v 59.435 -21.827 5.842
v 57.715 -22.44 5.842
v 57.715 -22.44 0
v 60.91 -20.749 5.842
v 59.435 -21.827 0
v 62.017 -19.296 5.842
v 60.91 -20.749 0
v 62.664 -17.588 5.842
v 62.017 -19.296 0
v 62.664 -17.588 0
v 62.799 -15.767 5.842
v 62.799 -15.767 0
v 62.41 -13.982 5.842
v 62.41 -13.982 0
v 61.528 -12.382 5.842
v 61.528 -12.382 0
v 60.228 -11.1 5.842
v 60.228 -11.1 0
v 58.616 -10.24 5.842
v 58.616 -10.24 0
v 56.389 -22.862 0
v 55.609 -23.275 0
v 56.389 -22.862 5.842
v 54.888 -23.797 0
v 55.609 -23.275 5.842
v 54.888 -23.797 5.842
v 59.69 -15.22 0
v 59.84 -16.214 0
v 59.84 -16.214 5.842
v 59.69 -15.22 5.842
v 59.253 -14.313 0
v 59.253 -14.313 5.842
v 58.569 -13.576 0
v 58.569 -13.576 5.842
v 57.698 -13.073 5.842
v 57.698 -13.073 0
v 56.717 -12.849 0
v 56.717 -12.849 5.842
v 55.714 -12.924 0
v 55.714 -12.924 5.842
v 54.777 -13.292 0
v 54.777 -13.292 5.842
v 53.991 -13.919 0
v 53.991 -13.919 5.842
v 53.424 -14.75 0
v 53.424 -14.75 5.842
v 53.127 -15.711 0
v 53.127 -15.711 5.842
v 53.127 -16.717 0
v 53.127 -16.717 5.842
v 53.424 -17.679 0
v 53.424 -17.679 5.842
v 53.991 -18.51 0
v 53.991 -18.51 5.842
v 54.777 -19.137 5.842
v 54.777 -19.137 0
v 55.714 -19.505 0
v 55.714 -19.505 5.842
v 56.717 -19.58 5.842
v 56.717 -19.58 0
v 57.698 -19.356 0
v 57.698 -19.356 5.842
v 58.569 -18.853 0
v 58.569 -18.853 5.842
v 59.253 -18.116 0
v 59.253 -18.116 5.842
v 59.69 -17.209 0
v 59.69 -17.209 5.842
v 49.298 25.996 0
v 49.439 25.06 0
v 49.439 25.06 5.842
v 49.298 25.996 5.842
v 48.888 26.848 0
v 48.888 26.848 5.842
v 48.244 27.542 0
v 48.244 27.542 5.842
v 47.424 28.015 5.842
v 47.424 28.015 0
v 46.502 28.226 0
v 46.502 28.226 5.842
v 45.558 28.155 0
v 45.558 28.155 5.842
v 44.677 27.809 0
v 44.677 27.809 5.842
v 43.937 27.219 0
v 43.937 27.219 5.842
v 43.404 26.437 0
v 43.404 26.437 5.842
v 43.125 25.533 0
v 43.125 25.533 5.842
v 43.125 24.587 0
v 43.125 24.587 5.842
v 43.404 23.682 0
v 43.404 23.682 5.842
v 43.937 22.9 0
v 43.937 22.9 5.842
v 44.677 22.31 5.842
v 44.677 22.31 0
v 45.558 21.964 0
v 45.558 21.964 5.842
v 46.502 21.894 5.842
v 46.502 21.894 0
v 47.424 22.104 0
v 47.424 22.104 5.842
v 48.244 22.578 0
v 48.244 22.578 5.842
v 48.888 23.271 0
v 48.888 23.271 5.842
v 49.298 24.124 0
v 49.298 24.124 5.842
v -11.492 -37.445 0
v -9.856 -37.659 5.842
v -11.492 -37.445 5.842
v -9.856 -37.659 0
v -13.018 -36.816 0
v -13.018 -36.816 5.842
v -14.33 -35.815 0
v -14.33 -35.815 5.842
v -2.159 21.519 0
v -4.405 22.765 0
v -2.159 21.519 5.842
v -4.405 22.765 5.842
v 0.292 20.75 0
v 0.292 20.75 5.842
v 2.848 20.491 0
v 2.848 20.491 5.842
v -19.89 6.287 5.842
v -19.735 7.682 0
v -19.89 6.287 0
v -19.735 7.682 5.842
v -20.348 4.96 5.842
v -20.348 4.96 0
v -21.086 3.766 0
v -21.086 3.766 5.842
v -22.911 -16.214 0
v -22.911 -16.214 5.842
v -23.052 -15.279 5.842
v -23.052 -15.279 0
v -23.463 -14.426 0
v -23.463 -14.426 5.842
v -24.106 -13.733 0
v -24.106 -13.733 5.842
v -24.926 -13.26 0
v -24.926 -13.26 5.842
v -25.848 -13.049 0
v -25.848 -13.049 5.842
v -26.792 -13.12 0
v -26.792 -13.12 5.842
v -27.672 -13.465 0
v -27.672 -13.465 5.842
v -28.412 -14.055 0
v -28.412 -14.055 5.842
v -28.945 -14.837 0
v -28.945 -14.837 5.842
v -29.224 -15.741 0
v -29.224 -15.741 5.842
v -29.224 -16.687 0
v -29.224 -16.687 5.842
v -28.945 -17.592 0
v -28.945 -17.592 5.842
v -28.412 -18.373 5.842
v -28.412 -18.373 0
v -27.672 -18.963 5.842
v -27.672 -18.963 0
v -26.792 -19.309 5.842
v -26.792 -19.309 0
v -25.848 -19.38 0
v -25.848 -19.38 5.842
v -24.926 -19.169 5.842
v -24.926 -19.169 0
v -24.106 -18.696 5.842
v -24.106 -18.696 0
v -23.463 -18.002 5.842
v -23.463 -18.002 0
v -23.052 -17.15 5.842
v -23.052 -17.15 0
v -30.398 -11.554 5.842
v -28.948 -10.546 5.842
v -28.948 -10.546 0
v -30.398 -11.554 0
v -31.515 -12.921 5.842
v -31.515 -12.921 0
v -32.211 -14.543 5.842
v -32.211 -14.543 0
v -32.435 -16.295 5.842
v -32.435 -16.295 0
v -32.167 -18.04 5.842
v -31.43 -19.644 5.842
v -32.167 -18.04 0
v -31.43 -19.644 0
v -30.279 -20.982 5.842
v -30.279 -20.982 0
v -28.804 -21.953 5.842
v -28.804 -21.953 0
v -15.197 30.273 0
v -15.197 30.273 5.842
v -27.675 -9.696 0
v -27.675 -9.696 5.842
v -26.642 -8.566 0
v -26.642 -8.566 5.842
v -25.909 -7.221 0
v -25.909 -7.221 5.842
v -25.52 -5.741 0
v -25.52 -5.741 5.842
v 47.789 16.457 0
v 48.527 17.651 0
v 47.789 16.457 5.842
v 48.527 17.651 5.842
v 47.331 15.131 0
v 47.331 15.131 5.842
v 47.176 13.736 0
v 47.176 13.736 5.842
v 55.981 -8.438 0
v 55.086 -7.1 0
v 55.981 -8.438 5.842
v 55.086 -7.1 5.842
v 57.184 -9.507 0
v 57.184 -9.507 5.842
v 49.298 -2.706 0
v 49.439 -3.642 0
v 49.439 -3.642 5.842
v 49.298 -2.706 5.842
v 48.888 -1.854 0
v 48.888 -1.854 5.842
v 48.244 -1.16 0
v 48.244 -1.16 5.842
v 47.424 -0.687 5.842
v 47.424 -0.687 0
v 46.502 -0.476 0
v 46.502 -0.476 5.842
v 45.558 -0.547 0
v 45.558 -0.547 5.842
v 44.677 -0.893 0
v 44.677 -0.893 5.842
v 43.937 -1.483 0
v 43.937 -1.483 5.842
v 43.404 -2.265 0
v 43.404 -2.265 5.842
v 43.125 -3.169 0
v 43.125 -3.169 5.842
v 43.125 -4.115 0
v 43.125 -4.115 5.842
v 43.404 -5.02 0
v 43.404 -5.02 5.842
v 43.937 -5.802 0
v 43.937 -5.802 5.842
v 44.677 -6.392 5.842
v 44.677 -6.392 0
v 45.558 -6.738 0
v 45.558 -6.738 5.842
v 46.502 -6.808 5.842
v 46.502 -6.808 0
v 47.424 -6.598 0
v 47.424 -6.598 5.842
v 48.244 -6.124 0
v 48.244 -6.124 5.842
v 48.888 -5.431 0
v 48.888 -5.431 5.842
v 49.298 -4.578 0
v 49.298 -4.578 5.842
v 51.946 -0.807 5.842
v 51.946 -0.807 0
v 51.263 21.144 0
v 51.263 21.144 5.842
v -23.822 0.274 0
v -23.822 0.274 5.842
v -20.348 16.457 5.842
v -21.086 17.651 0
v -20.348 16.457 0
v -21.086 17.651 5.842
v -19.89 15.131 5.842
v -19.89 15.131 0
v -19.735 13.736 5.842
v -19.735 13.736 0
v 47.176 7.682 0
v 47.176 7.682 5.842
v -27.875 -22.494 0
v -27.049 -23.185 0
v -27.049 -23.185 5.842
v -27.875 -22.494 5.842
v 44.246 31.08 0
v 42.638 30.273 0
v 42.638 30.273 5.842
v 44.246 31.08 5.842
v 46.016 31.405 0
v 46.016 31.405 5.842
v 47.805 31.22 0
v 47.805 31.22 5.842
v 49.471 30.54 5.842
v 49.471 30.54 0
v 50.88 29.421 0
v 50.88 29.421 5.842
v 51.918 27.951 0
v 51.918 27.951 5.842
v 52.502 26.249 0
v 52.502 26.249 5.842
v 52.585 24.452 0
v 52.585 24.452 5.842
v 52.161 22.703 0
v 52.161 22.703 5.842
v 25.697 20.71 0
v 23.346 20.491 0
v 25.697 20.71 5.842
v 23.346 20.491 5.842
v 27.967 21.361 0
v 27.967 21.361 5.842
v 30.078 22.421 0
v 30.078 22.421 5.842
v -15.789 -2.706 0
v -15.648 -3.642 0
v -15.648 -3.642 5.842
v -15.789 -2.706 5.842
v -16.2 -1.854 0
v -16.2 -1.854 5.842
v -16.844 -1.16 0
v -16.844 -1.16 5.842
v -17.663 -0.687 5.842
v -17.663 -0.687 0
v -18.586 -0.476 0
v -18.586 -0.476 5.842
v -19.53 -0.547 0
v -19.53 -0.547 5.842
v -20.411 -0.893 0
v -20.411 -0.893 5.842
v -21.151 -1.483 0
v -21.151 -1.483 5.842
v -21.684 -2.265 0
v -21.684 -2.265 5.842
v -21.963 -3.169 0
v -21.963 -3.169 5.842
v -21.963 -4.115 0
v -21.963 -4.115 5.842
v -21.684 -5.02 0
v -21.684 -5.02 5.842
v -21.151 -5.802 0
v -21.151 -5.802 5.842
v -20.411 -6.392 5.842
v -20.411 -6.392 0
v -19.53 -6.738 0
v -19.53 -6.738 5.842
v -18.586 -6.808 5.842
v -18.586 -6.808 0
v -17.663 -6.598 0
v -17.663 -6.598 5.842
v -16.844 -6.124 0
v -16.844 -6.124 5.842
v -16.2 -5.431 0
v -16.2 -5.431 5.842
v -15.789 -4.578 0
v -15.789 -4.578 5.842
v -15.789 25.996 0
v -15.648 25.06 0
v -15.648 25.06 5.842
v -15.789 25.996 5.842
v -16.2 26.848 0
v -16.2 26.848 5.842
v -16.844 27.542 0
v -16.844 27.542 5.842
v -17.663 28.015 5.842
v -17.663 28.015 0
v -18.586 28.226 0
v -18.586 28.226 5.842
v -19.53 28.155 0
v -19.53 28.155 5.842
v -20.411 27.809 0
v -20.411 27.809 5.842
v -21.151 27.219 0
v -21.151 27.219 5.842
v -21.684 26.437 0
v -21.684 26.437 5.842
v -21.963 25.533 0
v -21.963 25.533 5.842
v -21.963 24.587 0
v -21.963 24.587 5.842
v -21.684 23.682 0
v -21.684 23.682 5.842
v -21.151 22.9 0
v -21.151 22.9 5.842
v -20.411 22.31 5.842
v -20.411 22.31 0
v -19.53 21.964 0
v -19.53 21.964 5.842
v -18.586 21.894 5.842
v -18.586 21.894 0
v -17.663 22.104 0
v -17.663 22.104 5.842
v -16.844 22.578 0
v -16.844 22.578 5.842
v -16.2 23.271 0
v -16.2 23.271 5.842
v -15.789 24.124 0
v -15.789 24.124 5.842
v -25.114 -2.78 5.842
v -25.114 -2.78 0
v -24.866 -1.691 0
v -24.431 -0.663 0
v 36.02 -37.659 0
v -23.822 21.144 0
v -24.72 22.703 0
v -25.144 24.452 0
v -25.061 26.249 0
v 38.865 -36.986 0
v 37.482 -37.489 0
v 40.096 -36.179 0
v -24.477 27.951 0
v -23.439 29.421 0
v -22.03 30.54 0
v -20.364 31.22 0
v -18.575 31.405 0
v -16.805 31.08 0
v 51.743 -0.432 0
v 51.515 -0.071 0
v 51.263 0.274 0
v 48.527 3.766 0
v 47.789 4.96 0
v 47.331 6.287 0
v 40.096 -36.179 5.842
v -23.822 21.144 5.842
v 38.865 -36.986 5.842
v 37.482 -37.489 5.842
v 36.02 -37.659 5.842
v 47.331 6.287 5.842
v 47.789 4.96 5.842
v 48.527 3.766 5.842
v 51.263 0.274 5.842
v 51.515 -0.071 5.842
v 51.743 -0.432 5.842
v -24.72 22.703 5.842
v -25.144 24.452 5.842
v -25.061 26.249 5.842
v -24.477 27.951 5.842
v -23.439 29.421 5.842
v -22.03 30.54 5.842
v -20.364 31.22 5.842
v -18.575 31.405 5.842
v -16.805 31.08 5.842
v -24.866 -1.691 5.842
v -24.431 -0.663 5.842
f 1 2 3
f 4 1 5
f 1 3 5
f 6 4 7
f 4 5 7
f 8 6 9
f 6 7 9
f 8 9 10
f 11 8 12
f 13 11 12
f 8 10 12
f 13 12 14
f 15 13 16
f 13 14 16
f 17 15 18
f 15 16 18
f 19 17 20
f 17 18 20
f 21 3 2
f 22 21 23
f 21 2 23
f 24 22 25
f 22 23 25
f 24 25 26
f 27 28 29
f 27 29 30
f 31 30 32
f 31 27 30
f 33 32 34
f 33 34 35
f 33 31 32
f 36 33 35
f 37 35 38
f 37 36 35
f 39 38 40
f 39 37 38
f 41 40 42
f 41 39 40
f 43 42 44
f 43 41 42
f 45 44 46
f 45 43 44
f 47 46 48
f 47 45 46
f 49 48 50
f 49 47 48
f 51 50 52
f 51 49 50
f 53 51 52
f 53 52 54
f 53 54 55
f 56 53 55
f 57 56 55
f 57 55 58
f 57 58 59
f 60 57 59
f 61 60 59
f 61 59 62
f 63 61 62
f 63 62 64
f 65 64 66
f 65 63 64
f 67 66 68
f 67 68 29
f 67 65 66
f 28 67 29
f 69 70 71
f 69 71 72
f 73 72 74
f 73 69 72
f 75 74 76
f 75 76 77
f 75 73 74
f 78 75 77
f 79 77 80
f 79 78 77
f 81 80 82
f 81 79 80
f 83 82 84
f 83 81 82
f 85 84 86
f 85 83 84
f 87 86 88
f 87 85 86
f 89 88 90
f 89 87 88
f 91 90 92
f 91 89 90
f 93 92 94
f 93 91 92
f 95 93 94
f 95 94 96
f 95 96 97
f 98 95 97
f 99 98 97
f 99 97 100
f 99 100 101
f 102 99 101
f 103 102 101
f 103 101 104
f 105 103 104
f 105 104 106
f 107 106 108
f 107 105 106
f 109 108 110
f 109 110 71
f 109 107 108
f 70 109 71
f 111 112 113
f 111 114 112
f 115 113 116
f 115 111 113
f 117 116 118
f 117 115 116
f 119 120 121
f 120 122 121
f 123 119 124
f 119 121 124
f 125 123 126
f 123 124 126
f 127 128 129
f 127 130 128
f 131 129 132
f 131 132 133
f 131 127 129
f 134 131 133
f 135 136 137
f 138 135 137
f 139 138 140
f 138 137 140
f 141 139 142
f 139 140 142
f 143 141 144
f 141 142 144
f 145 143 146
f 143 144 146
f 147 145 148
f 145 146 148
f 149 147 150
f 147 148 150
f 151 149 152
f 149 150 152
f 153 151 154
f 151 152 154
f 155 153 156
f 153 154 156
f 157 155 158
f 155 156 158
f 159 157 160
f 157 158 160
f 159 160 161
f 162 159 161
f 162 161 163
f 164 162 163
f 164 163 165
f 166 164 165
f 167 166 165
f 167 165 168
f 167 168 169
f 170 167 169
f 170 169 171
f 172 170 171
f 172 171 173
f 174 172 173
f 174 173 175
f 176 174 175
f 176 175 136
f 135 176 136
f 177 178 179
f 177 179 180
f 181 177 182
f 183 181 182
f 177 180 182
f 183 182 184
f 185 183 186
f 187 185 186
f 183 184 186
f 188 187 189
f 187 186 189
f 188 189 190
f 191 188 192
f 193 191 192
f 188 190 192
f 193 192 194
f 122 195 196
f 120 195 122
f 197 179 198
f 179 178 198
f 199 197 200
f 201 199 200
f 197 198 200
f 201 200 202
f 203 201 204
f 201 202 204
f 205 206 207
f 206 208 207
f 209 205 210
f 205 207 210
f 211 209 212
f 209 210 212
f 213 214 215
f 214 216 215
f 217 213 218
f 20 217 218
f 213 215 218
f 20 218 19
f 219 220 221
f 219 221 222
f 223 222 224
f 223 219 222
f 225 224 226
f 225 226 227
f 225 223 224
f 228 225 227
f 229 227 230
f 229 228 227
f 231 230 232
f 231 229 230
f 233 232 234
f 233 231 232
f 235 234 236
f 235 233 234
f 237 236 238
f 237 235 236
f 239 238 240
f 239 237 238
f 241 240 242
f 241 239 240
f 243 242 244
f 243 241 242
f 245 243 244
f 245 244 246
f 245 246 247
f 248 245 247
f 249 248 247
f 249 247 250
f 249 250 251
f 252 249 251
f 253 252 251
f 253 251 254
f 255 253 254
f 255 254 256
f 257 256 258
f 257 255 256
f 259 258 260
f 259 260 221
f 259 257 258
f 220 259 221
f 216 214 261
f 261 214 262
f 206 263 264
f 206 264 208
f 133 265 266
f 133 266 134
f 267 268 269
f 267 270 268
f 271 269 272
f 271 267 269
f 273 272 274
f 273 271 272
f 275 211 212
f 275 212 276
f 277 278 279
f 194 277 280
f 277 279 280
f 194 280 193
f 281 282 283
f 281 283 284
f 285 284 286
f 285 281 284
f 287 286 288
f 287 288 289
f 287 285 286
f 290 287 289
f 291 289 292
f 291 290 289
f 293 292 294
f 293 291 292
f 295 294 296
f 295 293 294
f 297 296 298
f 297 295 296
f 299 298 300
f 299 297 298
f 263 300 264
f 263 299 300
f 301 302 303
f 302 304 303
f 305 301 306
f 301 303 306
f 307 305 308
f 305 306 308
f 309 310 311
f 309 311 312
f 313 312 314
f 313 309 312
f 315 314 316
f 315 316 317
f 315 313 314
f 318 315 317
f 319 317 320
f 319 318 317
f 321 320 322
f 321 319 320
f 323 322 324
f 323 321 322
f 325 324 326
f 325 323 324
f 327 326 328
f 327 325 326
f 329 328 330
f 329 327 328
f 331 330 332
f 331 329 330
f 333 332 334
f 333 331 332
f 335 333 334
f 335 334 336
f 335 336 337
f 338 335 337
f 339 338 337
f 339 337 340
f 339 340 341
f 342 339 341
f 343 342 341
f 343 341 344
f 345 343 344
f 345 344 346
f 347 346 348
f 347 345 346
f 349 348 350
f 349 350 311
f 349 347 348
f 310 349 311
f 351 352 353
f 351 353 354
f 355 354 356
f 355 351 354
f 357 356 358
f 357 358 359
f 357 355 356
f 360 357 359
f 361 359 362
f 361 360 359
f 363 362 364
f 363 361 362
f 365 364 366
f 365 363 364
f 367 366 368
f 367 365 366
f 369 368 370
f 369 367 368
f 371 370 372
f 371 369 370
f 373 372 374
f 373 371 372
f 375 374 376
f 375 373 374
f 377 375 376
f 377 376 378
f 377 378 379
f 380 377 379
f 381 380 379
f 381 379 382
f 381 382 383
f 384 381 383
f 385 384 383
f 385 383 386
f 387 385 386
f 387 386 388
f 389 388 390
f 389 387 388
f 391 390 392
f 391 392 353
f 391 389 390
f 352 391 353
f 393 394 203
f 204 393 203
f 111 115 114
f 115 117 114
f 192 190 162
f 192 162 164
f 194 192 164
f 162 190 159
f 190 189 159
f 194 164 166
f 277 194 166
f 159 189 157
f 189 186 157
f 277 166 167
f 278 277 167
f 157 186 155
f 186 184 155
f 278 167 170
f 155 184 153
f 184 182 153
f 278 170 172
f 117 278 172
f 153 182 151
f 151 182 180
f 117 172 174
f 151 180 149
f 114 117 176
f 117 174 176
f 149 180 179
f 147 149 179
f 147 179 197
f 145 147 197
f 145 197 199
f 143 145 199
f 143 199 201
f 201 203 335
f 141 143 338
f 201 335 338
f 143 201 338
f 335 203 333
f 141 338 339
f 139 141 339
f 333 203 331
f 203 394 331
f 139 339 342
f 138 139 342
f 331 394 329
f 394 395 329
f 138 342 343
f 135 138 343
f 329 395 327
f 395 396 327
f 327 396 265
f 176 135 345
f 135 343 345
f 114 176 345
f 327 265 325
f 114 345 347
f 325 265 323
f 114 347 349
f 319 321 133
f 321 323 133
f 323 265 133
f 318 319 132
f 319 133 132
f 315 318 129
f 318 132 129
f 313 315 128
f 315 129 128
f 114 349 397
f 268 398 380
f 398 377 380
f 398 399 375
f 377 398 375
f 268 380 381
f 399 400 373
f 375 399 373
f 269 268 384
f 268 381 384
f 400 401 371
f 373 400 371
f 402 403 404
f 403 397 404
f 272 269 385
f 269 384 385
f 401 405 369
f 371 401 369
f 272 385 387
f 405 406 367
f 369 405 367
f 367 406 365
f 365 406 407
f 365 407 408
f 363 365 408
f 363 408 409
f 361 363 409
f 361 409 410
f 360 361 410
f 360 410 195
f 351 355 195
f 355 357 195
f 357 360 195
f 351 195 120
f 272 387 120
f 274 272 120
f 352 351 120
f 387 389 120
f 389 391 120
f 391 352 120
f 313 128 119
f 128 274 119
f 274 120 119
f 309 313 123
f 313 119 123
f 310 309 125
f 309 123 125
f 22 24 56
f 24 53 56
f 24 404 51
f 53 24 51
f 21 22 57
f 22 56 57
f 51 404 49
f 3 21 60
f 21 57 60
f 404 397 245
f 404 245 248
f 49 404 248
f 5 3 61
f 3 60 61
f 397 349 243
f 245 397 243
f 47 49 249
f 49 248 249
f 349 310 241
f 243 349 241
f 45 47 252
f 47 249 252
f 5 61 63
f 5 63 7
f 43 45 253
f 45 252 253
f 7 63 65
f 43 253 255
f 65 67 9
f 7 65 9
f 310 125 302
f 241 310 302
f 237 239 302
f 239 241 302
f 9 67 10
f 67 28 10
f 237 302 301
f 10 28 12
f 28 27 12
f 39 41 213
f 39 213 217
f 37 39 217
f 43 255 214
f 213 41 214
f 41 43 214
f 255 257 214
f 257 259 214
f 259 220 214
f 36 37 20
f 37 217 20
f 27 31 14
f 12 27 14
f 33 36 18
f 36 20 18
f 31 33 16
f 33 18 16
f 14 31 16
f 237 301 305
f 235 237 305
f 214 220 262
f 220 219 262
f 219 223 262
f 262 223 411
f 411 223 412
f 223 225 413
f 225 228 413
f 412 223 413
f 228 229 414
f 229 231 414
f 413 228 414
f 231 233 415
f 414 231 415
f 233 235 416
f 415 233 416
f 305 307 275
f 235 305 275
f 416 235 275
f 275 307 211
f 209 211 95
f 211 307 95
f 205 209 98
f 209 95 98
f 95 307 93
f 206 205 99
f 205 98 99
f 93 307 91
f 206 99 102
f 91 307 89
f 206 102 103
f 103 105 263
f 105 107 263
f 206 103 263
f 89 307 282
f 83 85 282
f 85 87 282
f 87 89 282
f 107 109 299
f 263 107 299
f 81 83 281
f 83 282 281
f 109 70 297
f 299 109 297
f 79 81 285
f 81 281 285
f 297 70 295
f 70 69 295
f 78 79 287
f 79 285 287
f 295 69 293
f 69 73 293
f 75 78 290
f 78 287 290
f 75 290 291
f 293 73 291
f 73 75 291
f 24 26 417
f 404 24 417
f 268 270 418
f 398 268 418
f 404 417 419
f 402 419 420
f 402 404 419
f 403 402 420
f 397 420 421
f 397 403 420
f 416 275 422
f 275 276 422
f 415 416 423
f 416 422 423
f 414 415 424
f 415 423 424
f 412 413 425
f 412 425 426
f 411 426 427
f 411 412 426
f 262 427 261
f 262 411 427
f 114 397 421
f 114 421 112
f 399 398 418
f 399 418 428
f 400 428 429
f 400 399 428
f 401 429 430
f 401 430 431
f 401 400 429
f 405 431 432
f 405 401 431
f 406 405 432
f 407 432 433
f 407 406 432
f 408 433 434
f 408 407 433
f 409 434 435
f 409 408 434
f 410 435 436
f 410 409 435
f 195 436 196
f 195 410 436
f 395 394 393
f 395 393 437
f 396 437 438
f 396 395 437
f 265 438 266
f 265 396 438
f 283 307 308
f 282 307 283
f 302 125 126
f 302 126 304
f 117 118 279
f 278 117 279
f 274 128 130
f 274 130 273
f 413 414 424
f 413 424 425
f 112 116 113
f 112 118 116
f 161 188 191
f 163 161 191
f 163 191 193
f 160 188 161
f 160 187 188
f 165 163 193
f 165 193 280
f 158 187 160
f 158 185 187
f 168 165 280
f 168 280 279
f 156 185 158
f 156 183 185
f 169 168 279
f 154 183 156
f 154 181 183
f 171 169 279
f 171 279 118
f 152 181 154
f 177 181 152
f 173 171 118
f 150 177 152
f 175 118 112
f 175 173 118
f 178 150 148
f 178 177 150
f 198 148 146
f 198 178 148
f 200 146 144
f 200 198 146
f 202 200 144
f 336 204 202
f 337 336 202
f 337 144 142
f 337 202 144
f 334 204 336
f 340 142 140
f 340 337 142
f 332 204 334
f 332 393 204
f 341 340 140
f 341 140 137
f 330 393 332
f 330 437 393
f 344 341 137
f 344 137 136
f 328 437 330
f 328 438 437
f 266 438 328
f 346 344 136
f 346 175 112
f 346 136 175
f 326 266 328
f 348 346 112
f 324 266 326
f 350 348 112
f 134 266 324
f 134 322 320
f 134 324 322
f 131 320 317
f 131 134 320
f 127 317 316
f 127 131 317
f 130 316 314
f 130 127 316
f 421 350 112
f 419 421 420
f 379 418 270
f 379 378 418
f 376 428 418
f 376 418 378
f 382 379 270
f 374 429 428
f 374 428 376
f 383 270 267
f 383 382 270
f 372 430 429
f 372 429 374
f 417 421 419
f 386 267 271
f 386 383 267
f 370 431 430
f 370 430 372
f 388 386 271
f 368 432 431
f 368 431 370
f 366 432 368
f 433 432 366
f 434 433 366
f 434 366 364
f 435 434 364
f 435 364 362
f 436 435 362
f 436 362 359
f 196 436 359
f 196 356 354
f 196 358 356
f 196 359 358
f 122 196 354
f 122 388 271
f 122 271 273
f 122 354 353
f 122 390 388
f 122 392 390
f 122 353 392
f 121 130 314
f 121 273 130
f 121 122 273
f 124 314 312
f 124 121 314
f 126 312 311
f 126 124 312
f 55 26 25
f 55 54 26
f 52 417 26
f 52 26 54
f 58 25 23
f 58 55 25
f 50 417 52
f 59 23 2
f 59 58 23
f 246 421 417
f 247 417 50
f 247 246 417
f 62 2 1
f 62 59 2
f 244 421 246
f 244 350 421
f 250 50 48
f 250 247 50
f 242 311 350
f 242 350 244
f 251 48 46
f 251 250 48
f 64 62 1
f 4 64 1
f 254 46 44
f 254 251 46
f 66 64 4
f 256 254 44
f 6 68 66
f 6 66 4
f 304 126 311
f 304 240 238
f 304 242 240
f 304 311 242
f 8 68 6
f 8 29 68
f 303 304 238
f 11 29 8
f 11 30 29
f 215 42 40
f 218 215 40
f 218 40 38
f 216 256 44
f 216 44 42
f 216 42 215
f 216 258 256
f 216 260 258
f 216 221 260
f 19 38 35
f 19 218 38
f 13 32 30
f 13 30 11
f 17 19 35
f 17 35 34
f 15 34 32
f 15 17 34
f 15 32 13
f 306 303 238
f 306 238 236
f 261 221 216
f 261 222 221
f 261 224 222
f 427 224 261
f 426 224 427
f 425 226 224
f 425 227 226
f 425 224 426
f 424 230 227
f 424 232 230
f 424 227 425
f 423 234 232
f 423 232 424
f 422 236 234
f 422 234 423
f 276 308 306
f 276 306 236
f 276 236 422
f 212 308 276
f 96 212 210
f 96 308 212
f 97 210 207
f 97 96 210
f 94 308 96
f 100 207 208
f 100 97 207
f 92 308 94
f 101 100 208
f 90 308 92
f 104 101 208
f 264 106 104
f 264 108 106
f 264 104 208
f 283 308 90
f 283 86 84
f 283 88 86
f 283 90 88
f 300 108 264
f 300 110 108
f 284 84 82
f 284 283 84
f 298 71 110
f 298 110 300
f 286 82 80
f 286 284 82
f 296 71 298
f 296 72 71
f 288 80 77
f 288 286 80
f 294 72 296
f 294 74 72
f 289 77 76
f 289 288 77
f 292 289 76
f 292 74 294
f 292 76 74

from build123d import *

# Parameters (mm, degrees)
SKETCH1_R           = 3.1750000000000016
SKETCH1_R_2         = 3.174999999999998
SKETCH1_R_3         = 3.1749999999999976
BOSS_EXTRUDE1_DEPTH = 5.842
FILLET1_R           = 6.35
FILLET2_R           = 12.7
BOSS_EXTRUDE2_START = -5.842
SKETCH2_R           = 3.3749999999999933
BOSS_EXTRUDE2_DEPTH = 5.842
SKETCH3_R           = 3.174229815615873
CUT_EXTRUDE1_DEPTH  = 74.47150684282778
FILLET3_R           = 6.35
CUT_EXTRUDE2_DEPTH  = 74.47150698753184
FILLET4_R           = 6.35


with BuildPart() as part:
    # Sketch1 → Boss-Extrude1 (new body)
    with BuildSketch(Plane.XY):
        with BuildLine():
            Line((-19.735202783136515, 15.926469991088537), (-23.82219128055887, 21.14411855360569))
            ThreePointArc((-23.82219128055887, 21.14411855360569), (-23.43878883536159, 29.420896018239304), (-15.19702887852625, 30.27262100199607))
            Line((-15.19702887852625, 30.27262100199607), (-1.1351215821202347, 20.490721215283713))
            Line((-1.1351215821202347, 20.490721215283713), (26.98869301069201, 20.49072121528371))
            Line((26.98869301069201, 20.49072121528371), (42.6381003070978, 30.272621001996075))
            ThreePointArc((42.6381003070978, 30.272621001996075), (50.87986026393313, 29.42089601823929), (51.26326270913039, 21.14411855360571))
            Line((51.26326270913039, 21.14411855360571), (47.176274211707955, 15.926469991088574))
            Line((47.176274211707955, 15.926469991088574), (47.176274211707955, 5.491172866054349))
            Line((47.176274211707955, 5.491172866054349), (51.26326270913039, 0.27352430353700524))
            ThreePointArc((51.26326270913039, 0.27352430353700524), (52.26703524751068, -1.5710682312081294), (52.614285714285785, -3.6421785714286505))
            Line((52.614285714285785, -3.6421785714286505), (52.614285714285785, -37.659455709821316))
            Line((52.614285714285785, -37.659455709821316), (-25.173214285713918, -37.659455709821316))
            Line((-25.173214285713918, -37.659455709821316), (-25.173214285713925, -3.6421785714286505))
            ThreePointArc((-25.173214285713925, -3.6421785714286505), (-24.825963818939076, -1.5710682312081503), (-23.822191280558854, 0.27352430353699286))
            Line((-23.822191280558854, 0.27352430353699286), (-19.735202783136522, 5.491172866054132))
            Line((-19.735202783136522, 5.491172866054132), (-19.735202783136515, 15.926469991088537))
        make_face()
        with Locations((-18.823214285714226, 25.059821428571347)):
            Circle(SKETCH1_R, mode=Mode.SUBTRACT)
        with Locations((46.26428571428577, 25.059821428571347)):
            Circle(SKETCH1_R_2, mode=Mode.SUBTRACT)
        with Locations((46.26428571428577, -3.6421785714286505)):
            Circle(SKETCH1_R_3, mode=Mode.SUBTRACT)
        with Locations((-18.823214285713924, -3.6421785714286505)):
            Circle(SKETCH1_R, mode=Mode.SUBTRACT)
    extrude(amount=BOSS_EXTRUDE1_DEPTH)

    # Fillet1
    fillet1_edges = [part.edges().sort_by_distance(p)[0] for p in [
        (47.176274211707955, 15.926469991088574, 2.921),
        (47.176274211707955, 5.491172866054349, 2.921),
        (-19.735202783136522, 5.491172866054132, 2.921),
        (-19.735202783136515, 15.926469991088537, 2.921),
    ]]
    fillet(fillet1_edges, radius=FILLET1_R)

    # Fillet2
    fillet2_edges = [part.edges().sort_by_distance(p)[0] for p in [
        (-1.1351215821202347, 20.490721215283713, 2.921),
        (26.98869301069201, 20.49072121528371, 2.921),
    ]]
    fillet(fillet2_edges, radius=FILLET2_R)

    # Sketch2 → Boss-Extrude2 (add)
    # profile 1 of 2: a face of its own
    with BuildSketch(Plane.XY.offset(5.842).offset(BOSS_EXTRUDE2_START)):
        with BuildLine():
            Line((52.614285714285785, -22.564372384825948), (56.4647972168636, -22.564372384825948))
            ThreePointArc((56.4647972168636, -22.564372384825948), (62.8147972168636, -16.214372384825946), (56.4647972168636, -9.864372384825945))
            Line((56.4647972168636, -9.864372384825945), (51.94643033410118, -0.8074418077232544))
            ThreePointArc((51.94643033410118, -0.8074418077232544), (52.44506715095817, -2.186005219081439), (52.614285714285785, -3.6421785714286505))
            Line((52.614285714285785, -3.6421785714286505), (52.614285714285785, -11.165009933138013))
            Line((52.614285714285785, -11.165009933138013), (52.614285714285785, -21.26373483651388))
            Line((52.614285714285785, -21.26373483651388), (52.614285714285785, -22.564372384825948))
        make_face()
        with Locations((56.4647972168636, -16.214372384825946)):
            Circle(SKETCH2_R, mode=Mode.SUBTRACT)
    # profile 2 of 2: a face of its own
    with BuildSketch(Plane.XY.offset(5.842).offset(BOSS_EXTRUDE2_START)):
        with BuildLine():
            Line((-25.11442078188718, -2.7800760122689354), (-26.085202783136417, -9.864372384825948))
            ThreePointArc((-26.085202783136417, -9.864372384825948), (-32.43520278313642, -16.21437238482595), (-26.085202783136413, -22.56437238482595))
            Line((-26.085202783136417, -22.56437238482595), (-25.17321428571397, -22.56437238482595))
            Line((-25.17321428571397, -22.56437238482595), (-25.17321428571397, -22.49854114294895))
            Line((-25.173214285713975, -22.49854114294895), (-25.173214285713986, -19.254769053504887))
            ThreePointArc((-25.173214285713996, -19.254769053504887), (-29.25943259875229, -16.214372384825957), (-25.17321428571401, -13.173975716147009))
            Line((-25.173214285714007, -13.173975716147009), (-25.17321428571402, -9.930203626702937))
            Line((-25.17321428571402, -9.930203626702937), (-25.173214285714042, -3.6421785714286496))
            ThreePointArc((-25.173214285714042, -3.6421785714286496), (-25.158498859065922, -3.2101260576638357), (-25.11442078188718, -2.7800760122689354))
        make_face()
    extrude(amount=BOSS_EXTRUDE2_DEPTH)

    # Sketch3 → Cut-Extrude1 (cut, through all)
    with BuildSketch(Plane.XY.offset(5.842)):
        with Locations((-26.085202783136417, -16.21437238482595)):
            Circle(SKETCH3_R)
    extrude(amount=-CUT_EXTRUDE1_DEPTH, mode=Mode.SUBTRACT)

    # Fillet3
    fillet3_edges = [part.edges().sort_by_distance(p)[0] for p in [
        (56.4647972168636, -9.864372384825945, 2.921),
        (52.614285714285785, -22.564372384825948, 2.921),
        (-25.17321428571397, -22.56437238482595, 2.921),
        (-26.085202783136417, -9.864372384825948, 2.921),
    ]]
    fillet(fillet3_edges, radius=FILLET3_R)

    # Sketch4 → Cut-Extrude2 (cut, through all)
    with BuildSketch(Plane.XY.offset(5.842)):
        with BuildLine():
            Line((-25.173214285713918, -37.659455709821316), (-12.473214285713917, -37.659455709821316))
            Line((-12.473214285713917, -37.659455709821316), (-27.048811913081487, -23.185421123073148))
            ThreePointArc((-27.048811913081487, -23.185421123073148), (-25.66083613916725, -25.250928515915028), (-25.17321428571392, -27.691219987623278))
            Line((-25.17321428571392, -27.691219987623278), (-25.173214285713918, -37.659455709821316))
        make_face()
        with BuildLine():
            Line((54.888473112152276, -23.796663637650127), (38.326785714286075, -37.659455709821316))
            Line((38.326785714286075, -37.659455709821316), (52.614285714285785, -37.659455709821316))
            Line((52.614285714285785, -37.659455709821316), (52.614285714285785, -28.665981005853762))
            ThreePointArc((52.614285714285785, -28.665981005853762), (53.21085586664066, -25.97887382745055), (54.888473112152276, -23.796663637650127))
        make_face()
    extrude(amount=-CUT_EXTRUDE2_DEPTH, mode=Mode.SUBTRACT)

    # Fillet4
    fillet4_edges = [part.edges().sort_by_distance(p)[0] for p in [
        (-12.473214285713917, -37.659455709821316, 2.921),
        (38.326785714286075, -37.659455709821316, 2.921),
    ]]
    fillet(fillet4_edges, radius=FILLET4_R)


solid = part.part
